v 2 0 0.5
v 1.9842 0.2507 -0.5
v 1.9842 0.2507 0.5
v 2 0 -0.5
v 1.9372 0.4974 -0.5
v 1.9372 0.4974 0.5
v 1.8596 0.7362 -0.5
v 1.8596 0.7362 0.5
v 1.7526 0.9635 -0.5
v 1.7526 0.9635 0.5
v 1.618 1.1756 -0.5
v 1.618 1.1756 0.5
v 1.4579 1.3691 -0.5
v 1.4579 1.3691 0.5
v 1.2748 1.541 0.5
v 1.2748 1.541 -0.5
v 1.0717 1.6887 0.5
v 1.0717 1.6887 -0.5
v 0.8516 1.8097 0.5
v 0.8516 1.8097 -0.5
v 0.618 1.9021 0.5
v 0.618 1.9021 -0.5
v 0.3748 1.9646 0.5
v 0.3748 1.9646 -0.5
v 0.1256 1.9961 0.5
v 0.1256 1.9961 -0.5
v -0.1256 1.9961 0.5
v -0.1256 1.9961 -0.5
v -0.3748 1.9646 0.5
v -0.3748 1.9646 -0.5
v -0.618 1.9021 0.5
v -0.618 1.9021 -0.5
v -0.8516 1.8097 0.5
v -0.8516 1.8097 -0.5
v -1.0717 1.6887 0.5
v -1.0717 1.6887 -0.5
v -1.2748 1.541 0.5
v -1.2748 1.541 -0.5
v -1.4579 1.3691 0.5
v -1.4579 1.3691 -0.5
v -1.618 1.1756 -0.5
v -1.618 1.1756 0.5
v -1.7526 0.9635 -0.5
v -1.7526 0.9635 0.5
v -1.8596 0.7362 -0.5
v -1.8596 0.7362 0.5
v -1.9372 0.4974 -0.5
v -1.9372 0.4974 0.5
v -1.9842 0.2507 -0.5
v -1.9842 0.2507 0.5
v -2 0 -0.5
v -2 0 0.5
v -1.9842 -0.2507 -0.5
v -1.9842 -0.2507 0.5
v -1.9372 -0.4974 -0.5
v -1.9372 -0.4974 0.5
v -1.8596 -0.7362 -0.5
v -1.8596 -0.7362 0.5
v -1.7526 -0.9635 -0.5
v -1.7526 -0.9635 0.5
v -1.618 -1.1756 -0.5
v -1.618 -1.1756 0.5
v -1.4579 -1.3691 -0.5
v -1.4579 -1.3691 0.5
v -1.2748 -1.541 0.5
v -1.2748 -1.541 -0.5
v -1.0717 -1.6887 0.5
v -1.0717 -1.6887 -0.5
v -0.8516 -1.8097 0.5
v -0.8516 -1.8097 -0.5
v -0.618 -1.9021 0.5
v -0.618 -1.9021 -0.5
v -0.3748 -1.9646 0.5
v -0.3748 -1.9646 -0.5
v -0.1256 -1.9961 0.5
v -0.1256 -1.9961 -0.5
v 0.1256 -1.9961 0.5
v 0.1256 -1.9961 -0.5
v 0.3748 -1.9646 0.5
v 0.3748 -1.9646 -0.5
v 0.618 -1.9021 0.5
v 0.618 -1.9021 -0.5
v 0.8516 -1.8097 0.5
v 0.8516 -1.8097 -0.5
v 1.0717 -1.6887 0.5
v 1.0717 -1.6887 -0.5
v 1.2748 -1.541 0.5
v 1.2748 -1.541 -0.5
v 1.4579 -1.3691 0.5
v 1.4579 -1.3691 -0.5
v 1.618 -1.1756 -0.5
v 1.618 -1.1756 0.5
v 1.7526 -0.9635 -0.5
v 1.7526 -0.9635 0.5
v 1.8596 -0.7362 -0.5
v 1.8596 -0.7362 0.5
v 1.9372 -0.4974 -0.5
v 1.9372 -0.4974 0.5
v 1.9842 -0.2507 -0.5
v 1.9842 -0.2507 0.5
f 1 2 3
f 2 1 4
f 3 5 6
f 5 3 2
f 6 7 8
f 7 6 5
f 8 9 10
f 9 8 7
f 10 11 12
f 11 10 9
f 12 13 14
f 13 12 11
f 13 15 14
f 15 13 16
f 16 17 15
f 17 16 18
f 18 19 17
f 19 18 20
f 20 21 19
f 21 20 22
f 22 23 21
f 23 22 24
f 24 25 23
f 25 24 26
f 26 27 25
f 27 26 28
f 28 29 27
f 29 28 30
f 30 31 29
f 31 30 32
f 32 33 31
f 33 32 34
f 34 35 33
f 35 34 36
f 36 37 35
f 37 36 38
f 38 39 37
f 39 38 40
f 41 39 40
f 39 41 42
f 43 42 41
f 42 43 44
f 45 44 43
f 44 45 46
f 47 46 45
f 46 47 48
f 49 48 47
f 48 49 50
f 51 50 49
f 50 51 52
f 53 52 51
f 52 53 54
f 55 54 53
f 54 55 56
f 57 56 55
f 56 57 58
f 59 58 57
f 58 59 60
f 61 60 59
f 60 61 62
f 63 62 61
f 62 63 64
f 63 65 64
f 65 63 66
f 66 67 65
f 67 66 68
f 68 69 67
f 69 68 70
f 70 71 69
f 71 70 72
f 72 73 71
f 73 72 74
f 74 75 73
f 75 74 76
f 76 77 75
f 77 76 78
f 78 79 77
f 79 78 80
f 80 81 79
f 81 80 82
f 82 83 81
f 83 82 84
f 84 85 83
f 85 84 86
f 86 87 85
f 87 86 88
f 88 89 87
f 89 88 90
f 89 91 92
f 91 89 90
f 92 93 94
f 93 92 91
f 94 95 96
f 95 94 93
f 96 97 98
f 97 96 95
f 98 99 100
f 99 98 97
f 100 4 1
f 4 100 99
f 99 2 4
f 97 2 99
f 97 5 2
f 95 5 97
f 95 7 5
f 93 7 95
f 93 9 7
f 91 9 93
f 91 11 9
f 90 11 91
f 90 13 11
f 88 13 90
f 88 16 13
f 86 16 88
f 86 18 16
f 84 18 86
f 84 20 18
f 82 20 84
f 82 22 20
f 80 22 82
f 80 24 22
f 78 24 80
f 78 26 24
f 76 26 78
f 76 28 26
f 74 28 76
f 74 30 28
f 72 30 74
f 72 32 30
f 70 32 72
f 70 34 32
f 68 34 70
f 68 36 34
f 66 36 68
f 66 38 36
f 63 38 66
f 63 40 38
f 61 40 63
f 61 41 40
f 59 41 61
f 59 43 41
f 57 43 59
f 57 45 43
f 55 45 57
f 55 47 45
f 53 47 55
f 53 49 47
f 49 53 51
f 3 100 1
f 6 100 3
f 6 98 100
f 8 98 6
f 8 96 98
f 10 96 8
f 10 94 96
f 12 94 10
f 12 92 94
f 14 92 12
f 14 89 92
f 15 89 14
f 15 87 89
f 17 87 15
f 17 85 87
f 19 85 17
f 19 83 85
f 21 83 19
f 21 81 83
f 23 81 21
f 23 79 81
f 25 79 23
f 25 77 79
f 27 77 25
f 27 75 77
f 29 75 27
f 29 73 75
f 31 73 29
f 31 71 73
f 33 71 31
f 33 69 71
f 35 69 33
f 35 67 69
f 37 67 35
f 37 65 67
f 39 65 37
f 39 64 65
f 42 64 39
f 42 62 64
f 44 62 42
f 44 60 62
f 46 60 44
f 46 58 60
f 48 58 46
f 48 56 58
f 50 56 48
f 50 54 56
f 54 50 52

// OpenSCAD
$fn = 50;

neodymMagnet(2,1);

module neodymMagnet(rad, height){
	translate([0,0,-height/2]) cylinder(r=rad, h=height);
}
